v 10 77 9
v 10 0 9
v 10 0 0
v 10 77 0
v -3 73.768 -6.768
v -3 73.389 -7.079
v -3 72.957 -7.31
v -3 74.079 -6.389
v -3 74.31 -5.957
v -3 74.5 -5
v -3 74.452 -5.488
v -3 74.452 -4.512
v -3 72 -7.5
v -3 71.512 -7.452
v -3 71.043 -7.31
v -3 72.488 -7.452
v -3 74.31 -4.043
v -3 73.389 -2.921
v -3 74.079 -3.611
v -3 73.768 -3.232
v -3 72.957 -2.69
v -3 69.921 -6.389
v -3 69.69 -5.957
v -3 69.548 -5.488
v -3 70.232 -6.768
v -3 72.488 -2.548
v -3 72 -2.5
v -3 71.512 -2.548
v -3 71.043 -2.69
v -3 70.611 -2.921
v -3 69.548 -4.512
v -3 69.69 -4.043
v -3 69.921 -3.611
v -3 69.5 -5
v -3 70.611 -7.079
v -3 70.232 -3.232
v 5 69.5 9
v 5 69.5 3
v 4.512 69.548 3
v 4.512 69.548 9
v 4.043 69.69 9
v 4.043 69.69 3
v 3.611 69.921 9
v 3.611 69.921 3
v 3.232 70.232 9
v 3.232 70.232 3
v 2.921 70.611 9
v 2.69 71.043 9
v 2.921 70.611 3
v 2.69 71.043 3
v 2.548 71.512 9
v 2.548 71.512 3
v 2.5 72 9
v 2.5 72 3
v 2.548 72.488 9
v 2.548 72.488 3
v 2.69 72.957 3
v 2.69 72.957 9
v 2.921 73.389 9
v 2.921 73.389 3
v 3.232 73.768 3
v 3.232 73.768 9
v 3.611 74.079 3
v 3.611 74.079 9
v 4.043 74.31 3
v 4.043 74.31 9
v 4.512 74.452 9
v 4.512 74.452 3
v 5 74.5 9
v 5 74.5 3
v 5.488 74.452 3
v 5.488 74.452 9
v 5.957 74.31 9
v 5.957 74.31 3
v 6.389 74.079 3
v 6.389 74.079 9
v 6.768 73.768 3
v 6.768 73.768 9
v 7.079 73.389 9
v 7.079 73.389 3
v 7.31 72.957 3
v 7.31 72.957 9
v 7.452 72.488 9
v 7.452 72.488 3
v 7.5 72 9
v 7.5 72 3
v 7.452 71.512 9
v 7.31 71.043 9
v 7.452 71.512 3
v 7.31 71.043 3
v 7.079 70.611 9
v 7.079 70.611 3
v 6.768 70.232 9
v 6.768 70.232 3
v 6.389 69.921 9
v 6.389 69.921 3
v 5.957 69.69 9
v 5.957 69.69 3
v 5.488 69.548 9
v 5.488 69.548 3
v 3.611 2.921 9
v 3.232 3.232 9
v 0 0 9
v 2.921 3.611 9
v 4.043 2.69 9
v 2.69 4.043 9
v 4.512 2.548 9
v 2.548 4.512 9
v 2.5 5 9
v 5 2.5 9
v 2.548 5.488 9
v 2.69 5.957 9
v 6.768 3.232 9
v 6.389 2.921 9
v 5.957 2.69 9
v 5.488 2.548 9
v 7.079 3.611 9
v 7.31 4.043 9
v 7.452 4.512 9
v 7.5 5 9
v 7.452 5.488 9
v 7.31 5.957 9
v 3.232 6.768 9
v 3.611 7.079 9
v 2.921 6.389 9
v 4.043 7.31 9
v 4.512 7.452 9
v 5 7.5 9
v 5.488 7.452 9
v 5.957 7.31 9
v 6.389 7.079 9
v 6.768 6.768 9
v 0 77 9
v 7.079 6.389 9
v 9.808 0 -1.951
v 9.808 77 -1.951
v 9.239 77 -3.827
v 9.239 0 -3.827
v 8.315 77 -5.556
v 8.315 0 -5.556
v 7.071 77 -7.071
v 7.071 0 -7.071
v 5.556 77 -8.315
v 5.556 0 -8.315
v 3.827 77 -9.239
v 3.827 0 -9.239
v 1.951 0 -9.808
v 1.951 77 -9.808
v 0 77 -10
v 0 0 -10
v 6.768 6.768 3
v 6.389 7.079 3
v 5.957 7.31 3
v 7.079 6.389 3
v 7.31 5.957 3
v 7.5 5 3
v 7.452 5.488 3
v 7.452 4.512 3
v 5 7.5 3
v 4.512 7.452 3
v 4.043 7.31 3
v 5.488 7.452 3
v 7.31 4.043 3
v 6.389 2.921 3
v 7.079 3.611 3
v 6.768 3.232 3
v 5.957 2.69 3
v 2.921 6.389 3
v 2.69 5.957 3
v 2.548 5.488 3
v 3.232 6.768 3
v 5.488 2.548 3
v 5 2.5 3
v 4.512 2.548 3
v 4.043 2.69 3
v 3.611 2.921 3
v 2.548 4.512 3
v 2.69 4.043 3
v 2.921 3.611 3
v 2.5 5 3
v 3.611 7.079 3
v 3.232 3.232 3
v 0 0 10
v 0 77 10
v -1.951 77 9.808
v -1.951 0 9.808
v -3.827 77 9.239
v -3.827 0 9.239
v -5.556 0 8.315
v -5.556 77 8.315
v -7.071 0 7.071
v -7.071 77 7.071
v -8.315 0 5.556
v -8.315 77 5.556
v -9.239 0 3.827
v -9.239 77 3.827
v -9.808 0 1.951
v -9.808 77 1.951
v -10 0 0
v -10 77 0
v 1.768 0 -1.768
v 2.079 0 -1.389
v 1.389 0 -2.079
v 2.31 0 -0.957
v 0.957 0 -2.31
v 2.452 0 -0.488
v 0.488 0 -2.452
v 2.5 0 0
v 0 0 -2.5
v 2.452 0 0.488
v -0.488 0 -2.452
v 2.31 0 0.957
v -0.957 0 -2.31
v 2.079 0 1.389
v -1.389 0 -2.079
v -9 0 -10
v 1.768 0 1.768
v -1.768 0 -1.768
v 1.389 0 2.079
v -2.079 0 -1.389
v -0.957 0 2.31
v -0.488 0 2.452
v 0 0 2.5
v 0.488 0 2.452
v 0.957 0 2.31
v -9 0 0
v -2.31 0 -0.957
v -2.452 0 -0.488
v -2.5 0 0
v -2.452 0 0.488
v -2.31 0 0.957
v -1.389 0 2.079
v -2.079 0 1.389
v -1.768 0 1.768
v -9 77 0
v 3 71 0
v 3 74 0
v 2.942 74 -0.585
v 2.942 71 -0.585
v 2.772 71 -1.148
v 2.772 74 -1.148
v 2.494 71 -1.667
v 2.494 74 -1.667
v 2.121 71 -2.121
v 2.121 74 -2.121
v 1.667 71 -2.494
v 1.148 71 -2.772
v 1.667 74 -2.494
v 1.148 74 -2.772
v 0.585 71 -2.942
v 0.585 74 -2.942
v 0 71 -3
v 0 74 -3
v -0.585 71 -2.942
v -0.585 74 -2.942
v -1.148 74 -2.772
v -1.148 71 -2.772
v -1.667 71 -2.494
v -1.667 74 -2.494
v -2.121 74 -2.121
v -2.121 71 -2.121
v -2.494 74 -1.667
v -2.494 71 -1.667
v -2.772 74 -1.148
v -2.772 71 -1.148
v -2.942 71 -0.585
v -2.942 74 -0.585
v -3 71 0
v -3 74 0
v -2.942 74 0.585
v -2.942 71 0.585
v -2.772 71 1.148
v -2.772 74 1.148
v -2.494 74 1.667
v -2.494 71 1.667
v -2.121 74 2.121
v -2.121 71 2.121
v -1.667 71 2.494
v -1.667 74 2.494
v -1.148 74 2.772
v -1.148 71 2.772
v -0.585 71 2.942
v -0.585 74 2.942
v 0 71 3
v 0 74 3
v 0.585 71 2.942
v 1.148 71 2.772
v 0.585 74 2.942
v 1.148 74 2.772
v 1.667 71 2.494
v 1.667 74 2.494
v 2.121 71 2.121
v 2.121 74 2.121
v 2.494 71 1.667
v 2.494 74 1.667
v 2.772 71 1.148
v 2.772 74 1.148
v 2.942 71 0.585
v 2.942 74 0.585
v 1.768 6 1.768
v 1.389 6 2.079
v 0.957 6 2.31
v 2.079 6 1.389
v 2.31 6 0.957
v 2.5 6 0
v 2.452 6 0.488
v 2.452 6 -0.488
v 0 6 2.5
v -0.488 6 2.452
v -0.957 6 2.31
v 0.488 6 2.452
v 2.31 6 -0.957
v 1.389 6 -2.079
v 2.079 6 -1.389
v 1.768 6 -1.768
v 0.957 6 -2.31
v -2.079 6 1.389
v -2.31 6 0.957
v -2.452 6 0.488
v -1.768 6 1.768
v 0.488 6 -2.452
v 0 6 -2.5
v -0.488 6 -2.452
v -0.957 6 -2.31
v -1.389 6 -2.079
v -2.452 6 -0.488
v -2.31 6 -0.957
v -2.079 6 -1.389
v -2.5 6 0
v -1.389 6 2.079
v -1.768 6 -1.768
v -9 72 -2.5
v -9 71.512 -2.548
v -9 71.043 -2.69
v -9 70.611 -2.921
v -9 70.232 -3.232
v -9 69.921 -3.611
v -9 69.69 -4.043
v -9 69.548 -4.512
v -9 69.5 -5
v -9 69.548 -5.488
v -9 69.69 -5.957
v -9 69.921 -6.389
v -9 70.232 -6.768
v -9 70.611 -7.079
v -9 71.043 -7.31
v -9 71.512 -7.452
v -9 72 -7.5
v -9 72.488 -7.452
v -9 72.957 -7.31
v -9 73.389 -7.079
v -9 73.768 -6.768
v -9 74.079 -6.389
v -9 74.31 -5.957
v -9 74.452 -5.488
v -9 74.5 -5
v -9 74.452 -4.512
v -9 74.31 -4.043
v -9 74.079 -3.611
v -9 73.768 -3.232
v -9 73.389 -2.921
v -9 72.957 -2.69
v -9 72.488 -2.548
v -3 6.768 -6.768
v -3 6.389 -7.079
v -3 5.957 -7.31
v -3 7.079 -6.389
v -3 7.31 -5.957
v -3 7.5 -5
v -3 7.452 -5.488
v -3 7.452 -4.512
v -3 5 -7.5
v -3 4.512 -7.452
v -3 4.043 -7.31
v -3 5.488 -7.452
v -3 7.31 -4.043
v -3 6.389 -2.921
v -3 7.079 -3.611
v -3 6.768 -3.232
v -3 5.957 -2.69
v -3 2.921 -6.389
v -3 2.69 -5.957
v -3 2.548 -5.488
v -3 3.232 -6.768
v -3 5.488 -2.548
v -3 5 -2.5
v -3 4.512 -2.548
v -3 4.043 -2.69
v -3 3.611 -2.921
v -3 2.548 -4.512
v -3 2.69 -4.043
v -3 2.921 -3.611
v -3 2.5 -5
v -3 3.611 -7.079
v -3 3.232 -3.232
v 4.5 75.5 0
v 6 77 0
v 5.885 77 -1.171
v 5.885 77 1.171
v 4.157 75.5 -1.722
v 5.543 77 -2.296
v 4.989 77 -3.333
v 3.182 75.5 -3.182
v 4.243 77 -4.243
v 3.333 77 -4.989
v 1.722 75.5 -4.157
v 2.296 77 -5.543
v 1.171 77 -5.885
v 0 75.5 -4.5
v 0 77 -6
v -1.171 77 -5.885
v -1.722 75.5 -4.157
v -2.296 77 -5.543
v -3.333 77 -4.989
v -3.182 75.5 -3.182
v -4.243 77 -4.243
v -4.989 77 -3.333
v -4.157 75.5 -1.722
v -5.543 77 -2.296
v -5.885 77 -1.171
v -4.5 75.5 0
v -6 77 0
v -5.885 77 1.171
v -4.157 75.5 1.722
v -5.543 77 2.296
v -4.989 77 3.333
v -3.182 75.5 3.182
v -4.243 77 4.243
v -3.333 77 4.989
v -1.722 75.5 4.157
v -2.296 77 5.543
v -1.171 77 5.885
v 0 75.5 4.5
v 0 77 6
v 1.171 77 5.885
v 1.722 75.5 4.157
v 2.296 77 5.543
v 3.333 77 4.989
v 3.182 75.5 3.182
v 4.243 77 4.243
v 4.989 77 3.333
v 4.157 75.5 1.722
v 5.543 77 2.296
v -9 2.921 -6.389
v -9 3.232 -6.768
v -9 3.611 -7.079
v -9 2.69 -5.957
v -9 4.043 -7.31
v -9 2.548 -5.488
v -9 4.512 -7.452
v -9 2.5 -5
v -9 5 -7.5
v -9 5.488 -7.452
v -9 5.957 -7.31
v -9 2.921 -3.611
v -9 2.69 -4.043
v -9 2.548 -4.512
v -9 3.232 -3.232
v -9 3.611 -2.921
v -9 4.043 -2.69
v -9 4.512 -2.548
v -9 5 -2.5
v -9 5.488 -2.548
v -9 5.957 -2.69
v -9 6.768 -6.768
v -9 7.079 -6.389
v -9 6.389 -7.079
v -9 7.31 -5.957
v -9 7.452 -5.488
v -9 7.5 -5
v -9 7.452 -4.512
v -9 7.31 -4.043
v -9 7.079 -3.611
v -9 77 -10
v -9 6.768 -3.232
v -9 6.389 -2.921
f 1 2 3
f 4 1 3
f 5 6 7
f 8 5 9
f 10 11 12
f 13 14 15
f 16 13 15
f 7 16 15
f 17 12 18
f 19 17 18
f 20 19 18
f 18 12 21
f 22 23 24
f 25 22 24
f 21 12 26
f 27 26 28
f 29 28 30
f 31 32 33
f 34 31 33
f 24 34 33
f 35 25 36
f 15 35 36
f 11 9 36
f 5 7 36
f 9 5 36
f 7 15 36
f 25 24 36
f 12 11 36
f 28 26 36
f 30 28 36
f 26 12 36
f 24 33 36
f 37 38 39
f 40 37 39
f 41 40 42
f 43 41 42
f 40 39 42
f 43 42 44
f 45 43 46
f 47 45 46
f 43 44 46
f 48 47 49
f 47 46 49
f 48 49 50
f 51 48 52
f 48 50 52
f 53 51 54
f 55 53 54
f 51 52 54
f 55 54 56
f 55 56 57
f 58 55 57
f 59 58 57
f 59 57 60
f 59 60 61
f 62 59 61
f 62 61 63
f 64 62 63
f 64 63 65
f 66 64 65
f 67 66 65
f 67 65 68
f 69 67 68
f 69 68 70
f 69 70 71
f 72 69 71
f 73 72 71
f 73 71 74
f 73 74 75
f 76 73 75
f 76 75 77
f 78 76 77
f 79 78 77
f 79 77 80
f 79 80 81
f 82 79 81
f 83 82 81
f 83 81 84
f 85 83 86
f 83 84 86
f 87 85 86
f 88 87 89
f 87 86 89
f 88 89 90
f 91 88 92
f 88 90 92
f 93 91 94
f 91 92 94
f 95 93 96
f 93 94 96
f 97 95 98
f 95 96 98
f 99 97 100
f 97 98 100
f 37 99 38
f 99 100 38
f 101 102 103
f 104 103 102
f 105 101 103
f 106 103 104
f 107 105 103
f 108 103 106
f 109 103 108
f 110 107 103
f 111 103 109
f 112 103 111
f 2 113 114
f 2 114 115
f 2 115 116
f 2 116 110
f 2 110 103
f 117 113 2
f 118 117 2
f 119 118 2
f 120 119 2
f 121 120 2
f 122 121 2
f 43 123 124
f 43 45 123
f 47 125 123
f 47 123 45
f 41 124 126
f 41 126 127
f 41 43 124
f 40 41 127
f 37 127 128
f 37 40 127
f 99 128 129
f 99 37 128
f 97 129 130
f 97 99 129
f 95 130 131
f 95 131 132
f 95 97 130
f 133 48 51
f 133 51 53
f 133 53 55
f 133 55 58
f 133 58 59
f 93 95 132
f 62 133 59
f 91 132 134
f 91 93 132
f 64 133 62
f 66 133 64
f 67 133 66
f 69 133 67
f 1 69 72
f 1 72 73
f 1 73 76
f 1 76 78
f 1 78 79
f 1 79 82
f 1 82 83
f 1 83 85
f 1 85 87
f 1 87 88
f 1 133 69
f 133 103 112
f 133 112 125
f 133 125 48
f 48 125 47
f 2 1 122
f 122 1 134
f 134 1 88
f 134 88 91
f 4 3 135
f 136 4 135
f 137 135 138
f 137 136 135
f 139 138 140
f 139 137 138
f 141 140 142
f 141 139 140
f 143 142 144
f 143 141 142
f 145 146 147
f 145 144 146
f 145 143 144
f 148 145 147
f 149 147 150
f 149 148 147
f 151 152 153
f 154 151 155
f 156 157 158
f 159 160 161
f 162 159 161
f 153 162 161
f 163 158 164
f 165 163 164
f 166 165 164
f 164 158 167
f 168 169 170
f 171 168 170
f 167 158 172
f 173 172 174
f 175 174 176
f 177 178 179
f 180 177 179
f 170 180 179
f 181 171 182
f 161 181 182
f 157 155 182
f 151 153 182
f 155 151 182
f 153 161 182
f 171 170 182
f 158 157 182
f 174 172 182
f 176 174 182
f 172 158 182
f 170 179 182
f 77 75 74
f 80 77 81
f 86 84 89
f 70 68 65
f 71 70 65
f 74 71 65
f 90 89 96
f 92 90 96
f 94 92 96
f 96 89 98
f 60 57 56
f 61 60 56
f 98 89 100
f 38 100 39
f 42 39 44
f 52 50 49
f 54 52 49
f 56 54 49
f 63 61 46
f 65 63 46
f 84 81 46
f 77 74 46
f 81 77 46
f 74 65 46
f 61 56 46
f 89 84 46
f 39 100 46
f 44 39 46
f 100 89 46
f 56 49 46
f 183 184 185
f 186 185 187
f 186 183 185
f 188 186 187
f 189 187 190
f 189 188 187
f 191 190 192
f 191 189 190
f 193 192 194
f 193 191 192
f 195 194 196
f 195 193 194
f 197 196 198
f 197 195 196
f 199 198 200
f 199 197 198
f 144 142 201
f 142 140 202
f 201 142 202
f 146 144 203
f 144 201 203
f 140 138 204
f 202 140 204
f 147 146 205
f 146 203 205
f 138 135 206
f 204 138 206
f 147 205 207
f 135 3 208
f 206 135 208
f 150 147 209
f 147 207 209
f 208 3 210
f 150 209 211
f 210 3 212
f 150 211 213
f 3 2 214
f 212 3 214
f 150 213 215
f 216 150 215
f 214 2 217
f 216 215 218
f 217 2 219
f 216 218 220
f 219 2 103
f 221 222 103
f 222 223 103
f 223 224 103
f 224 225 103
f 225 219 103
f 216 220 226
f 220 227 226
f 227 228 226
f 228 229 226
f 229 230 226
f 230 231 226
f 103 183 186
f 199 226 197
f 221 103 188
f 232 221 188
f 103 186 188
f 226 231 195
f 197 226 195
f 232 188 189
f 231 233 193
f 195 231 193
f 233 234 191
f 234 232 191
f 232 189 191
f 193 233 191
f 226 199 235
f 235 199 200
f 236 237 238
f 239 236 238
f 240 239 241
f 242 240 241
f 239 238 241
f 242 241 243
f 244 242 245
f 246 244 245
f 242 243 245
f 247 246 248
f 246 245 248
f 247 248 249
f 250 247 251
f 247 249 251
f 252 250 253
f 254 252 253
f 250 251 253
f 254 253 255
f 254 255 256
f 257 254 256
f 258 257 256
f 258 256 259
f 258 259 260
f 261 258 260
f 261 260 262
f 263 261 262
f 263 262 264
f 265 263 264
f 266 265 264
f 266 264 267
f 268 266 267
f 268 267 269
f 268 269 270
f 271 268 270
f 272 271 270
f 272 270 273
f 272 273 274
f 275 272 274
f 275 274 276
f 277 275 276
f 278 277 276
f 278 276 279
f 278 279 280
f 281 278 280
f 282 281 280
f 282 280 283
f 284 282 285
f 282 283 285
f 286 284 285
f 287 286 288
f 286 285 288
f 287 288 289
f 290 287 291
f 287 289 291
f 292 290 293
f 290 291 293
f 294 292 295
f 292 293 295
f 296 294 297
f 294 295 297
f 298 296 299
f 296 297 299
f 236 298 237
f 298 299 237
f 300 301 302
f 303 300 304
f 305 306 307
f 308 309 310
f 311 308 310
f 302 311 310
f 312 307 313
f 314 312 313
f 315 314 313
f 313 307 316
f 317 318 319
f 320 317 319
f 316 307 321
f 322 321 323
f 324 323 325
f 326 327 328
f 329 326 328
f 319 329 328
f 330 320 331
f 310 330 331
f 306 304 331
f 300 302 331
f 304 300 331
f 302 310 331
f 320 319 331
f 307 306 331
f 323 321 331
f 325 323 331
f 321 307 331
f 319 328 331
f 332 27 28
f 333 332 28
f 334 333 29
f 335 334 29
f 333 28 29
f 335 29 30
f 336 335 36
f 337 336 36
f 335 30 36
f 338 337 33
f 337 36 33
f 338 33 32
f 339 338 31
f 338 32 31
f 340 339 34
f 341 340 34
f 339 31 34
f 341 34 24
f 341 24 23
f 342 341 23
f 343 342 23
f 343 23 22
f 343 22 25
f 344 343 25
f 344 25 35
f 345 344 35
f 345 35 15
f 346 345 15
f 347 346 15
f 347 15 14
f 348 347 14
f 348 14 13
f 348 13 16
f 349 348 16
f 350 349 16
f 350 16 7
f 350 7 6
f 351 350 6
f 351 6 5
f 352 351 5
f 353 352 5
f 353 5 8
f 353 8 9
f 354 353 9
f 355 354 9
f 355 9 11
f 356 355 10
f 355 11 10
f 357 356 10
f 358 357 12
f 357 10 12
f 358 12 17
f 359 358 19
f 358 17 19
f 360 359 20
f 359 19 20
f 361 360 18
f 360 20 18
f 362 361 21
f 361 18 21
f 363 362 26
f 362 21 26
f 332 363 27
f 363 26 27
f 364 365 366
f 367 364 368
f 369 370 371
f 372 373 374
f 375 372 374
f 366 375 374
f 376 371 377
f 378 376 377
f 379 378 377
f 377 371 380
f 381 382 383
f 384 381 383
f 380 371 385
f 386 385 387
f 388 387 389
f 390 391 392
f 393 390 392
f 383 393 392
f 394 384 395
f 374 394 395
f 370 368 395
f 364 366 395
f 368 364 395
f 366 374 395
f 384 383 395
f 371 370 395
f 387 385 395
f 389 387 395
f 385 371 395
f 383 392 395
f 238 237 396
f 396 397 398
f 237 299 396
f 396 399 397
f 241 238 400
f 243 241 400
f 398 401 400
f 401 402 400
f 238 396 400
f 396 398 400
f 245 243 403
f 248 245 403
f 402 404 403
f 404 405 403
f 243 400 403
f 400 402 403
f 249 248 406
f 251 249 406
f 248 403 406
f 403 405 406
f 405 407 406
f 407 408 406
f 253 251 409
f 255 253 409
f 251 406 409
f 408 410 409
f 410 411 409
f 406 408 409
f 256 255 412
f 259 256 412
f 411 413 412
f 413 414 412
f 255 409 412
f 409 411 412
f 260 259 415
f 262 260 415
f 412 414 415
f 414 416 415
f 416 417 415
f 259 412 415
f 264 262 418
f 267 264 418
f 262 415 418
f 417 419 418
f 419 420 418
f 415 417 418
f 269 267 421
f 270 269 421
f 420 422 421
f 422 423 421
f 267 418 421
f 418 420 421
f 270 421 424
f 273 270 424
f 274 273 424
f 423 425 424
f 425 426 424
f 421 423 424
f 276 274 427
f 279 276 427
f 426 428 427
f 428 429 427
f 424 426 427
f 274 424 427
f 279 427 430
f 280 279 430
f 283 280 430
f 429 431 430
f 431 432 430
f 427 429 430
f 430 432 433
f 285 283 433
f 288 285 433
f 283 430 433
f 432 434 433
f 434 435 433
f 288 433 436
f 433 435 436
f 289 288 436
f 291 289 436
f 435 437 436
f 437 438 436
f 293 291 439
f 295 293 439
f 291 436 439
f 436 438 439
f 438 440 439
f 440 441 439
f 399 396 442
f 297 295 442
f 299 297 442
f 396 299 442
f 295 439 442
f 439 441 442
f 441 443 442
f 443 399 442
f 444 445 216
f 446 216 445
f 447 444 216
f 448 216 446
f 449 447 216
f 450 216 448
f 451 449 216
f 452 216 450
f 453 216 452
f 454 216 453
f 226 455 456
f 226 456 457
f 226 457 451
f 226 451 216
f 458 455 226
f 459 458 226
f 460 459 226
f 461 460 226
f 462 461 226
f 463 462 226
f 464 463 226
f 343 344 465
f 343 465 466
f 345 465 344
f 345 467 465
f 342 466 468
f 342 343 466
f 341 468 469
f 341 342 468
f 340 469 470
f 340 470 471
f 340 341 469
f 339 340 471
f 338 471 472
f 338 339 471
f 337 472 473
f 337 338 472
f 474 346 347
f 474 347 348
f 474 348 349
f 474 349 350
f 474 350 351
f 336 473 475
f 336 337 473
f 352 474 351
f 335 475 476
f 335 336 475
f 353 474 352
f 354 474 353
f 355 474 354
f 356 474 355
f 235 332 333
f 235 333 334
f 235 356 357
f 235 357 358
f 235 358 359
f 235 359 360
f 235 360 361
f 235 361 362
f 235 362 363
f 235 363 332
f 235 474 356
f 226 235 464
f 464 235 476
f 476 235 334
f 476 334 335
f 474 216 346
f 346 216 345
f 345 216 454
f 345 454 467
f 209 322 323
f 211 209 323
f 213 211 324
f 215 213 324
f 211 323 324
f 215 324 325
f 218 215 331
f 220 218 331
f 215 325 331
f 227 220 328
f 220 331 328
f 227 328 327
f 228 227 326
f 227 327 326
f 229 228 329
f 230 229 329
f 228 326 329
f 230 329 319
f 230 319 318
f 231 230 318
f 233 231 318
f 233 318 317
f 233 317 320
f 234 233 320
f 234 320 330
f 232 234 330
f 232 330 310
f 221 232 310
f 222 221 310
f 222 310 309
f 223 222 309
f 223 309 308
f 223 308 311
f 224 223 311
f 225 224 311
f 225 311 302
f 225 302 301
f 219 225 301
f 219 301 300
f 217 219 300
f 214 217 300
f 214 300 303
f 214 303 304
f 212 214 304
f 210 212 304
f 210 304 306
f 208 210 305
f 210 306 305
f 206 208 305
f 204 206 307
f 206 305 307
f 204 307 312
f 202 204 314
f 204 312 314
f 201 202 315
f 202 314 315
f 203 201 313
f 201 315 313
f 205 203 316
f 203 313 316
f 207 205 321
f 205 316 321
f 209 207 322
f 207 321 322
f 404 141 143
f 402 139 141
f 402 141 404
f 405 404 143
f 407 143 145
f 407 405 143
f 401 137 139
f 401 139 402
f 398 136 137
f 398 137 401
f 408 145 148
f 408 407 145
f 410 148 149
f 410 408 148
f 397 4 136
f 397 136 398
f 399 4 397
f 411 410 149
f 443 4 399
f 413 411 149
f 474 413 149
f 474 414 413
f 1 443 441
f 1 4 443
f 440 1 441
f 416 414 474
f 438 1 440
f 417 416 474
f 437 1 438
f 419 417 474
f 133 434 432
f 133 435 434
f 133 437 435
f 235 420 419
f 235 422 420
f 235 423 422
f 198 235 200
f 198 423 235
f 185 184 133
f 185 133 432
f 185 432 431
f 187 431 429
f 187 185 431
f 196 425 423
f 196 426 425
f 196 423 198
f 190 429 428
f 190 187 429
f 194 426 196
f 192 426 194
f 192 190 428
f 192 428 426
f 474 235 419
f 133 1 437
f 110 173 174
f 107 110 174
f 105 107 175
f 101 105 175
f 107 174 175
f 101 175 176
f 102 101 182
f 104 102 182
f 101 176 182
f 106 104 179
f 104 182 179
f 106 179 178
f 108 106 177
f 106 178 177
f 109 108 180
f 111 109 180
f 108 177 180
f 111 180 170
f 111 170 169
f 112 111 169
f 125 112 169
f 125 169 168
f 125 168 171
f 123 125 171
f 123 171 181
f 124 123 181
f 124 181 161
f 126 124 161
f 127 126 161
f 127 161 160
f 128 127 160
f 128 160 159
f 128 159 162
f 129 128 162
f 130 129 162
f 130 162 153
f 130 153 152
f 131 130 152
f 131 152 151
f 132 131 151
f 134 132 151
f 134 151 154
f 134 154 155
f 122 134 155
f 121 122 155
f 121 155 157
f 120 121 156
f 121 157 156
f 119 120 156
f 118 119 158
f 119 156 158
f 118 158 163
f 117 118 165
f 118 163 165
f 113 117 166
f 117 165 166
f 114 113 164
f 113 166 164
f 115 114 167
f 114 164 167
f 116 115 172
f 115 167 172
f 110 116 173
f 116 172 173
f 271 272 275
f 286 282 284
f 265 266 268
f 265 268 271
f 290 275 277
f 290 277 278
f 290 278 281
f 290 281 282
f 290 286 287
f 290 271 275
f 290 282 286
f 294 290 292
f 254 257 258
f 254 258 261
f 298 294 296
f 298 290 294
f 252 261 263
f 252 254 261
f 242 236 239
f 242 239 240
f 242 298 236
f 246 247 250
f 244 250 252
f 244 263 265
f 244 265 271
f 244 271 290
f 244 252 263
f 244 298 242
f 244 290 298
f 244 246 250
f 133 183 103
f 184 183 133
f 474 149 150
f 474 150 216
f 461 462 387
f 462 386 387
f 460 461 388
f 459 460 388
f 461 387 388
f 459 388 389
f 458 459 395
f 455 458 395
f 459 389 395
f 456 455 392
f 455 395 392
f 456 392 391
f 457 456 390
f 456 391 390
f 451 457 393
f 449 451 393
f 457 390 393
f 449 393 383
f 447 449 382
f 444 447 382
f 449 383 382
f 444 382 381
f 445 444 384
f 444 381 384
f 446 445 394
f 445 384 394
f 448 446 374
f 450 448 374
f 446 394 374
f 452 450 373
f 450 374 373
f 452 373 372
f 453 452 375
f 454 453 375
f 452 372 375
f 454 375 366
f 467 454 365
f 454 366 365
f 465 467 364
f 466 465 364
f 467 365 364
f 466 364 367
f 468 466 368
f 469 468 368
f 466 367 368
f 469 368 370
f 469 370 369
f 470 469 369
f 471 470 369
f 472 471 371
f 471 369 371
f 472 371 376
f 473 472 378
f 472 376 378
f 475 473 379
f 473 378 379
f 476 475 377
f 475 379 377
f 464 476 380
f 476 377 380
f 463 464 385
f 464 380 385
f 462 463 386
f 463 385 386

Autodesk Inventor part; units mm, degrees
ref_plane "YZ Plane" through (0, 0, 0) normal (1, 0, 0) x (0, 1, 0)
ref_plane "XZ Plane" through (0, 0, 0) normal (0, 1, 0) x (-1, 0, 0)
ref_plane "XY Plane" through (0, 0, 0) normal (0, 0, 1) x (1, 0, 0)
sketch "スケッチ1" plane through (0, 0, 0) normal (0, 1, 0) x (-1, 0, 0)
  circle A0 centre (0, 0) radius 10
  line L0 (0, 10) -> (-10, 10)
  line L1 (-10, 10) -> (-10, -10)
  line L2 (-10, -10) -> (10, -10)
  line L3 (10, -10) -> (10, 0)
  dimension "d0" = 20
  dimension "d1" = 10
  dimension "d2" = 10
extrude "押し出し1" add sketch "スケッチ1" along normal blind 77
sketch "スケッチ2" plane through (0, 0, 10) normal (0, 0, 1) x (1, 0, 0)
  line L0 (0, 0) -> (0, 77) projected
  line L1 (0, 77) -> (10, 77) projected
  line L2 (10, 77) -> (10, 0) projected
  line L3 (10, 0) -> (0, 0) projected
extrude "押し出し2" cut sketch "スケッチ2" against normal blind 1
sketch "スケッチ3" plane through (-10, 0, -10) normal (-1, 0, 0) x (0, 0, 1)
  line L0 (0, 77) -> (10, 77) projected
  line L1 (10, 0) -> (10, 77) projected
  line L2 (10, 0) -> (0, 0) projected
  line L3 (0, 0) -> (0, 77) projected
extrude "押し出し3" cut sketch "スケッチ3" against normal blind 1
sketch "スケッチ4" plane through (0, 0, 9) normal (0, 0, 1) x (1, 0, 0)
  line L0 (0, 77) -> (10, 77) projected
  line L1 (10, 77) -> (10, 0) projected
  line L2 (10, 0) -> (0, 0) projected
  point P0 (5, 72)
  point P1 (5, 5)
  dimension "d9" = 5
  dimension "d10" = 5
  dimension "d11" = 5
hole "穴1" at (5, 72, 9) at (5, 5, 9) direction (0, 0, -1) diameter 5 depth 6
sketch "スケッチ5" plane through (0, 0, 0) normal (0, 1, 0) x (1, 0, 0)
  point P0 (0, 0)
hole "穴2" at (0, 0, 0) direction (0, 1, 0) diameter 5 depth 6
sketch "スケッチ6" plane through (-9, 0, -10) normal (-1, 0, 0) x (0, 0, 1)
  line L0 (0, 0) -> (0, 77) projected
  line L1 (0, 77) -> (10, 77) projected
  line L2 (10, 0) -> (0, 0) projected
  point P0 (5, 72)
  point P1 (5, 5)
  dimension "d26" = 5
  dimension "d27" = 5
  dimension "d28" = 5
  dimension "d29" = 5
hole "穴3" at (-9, 72, -5) at (-9, 5, -5) direction (1, 0, 0) diameter 5 depth 6
sketch "スケッチ7" plane through (0, 77, 0) normal (0, 1, 0) x (1, 0, 0)
  circle A0 centre (0, 0) radius 3
  dimension "d37" = 6
extrude "押し出し4" cut sketch "スケッチ7" against normal blind 6
chamfer "面取り1" distance 3 angle 45 1 edges at (-3, 77, 0)
fillet "フィレット1" radius 10 1 edges at (10, 38.5, -10)
equation "\"d11\" = d9"
properties part number "base6" material "ABS プラスチック"
